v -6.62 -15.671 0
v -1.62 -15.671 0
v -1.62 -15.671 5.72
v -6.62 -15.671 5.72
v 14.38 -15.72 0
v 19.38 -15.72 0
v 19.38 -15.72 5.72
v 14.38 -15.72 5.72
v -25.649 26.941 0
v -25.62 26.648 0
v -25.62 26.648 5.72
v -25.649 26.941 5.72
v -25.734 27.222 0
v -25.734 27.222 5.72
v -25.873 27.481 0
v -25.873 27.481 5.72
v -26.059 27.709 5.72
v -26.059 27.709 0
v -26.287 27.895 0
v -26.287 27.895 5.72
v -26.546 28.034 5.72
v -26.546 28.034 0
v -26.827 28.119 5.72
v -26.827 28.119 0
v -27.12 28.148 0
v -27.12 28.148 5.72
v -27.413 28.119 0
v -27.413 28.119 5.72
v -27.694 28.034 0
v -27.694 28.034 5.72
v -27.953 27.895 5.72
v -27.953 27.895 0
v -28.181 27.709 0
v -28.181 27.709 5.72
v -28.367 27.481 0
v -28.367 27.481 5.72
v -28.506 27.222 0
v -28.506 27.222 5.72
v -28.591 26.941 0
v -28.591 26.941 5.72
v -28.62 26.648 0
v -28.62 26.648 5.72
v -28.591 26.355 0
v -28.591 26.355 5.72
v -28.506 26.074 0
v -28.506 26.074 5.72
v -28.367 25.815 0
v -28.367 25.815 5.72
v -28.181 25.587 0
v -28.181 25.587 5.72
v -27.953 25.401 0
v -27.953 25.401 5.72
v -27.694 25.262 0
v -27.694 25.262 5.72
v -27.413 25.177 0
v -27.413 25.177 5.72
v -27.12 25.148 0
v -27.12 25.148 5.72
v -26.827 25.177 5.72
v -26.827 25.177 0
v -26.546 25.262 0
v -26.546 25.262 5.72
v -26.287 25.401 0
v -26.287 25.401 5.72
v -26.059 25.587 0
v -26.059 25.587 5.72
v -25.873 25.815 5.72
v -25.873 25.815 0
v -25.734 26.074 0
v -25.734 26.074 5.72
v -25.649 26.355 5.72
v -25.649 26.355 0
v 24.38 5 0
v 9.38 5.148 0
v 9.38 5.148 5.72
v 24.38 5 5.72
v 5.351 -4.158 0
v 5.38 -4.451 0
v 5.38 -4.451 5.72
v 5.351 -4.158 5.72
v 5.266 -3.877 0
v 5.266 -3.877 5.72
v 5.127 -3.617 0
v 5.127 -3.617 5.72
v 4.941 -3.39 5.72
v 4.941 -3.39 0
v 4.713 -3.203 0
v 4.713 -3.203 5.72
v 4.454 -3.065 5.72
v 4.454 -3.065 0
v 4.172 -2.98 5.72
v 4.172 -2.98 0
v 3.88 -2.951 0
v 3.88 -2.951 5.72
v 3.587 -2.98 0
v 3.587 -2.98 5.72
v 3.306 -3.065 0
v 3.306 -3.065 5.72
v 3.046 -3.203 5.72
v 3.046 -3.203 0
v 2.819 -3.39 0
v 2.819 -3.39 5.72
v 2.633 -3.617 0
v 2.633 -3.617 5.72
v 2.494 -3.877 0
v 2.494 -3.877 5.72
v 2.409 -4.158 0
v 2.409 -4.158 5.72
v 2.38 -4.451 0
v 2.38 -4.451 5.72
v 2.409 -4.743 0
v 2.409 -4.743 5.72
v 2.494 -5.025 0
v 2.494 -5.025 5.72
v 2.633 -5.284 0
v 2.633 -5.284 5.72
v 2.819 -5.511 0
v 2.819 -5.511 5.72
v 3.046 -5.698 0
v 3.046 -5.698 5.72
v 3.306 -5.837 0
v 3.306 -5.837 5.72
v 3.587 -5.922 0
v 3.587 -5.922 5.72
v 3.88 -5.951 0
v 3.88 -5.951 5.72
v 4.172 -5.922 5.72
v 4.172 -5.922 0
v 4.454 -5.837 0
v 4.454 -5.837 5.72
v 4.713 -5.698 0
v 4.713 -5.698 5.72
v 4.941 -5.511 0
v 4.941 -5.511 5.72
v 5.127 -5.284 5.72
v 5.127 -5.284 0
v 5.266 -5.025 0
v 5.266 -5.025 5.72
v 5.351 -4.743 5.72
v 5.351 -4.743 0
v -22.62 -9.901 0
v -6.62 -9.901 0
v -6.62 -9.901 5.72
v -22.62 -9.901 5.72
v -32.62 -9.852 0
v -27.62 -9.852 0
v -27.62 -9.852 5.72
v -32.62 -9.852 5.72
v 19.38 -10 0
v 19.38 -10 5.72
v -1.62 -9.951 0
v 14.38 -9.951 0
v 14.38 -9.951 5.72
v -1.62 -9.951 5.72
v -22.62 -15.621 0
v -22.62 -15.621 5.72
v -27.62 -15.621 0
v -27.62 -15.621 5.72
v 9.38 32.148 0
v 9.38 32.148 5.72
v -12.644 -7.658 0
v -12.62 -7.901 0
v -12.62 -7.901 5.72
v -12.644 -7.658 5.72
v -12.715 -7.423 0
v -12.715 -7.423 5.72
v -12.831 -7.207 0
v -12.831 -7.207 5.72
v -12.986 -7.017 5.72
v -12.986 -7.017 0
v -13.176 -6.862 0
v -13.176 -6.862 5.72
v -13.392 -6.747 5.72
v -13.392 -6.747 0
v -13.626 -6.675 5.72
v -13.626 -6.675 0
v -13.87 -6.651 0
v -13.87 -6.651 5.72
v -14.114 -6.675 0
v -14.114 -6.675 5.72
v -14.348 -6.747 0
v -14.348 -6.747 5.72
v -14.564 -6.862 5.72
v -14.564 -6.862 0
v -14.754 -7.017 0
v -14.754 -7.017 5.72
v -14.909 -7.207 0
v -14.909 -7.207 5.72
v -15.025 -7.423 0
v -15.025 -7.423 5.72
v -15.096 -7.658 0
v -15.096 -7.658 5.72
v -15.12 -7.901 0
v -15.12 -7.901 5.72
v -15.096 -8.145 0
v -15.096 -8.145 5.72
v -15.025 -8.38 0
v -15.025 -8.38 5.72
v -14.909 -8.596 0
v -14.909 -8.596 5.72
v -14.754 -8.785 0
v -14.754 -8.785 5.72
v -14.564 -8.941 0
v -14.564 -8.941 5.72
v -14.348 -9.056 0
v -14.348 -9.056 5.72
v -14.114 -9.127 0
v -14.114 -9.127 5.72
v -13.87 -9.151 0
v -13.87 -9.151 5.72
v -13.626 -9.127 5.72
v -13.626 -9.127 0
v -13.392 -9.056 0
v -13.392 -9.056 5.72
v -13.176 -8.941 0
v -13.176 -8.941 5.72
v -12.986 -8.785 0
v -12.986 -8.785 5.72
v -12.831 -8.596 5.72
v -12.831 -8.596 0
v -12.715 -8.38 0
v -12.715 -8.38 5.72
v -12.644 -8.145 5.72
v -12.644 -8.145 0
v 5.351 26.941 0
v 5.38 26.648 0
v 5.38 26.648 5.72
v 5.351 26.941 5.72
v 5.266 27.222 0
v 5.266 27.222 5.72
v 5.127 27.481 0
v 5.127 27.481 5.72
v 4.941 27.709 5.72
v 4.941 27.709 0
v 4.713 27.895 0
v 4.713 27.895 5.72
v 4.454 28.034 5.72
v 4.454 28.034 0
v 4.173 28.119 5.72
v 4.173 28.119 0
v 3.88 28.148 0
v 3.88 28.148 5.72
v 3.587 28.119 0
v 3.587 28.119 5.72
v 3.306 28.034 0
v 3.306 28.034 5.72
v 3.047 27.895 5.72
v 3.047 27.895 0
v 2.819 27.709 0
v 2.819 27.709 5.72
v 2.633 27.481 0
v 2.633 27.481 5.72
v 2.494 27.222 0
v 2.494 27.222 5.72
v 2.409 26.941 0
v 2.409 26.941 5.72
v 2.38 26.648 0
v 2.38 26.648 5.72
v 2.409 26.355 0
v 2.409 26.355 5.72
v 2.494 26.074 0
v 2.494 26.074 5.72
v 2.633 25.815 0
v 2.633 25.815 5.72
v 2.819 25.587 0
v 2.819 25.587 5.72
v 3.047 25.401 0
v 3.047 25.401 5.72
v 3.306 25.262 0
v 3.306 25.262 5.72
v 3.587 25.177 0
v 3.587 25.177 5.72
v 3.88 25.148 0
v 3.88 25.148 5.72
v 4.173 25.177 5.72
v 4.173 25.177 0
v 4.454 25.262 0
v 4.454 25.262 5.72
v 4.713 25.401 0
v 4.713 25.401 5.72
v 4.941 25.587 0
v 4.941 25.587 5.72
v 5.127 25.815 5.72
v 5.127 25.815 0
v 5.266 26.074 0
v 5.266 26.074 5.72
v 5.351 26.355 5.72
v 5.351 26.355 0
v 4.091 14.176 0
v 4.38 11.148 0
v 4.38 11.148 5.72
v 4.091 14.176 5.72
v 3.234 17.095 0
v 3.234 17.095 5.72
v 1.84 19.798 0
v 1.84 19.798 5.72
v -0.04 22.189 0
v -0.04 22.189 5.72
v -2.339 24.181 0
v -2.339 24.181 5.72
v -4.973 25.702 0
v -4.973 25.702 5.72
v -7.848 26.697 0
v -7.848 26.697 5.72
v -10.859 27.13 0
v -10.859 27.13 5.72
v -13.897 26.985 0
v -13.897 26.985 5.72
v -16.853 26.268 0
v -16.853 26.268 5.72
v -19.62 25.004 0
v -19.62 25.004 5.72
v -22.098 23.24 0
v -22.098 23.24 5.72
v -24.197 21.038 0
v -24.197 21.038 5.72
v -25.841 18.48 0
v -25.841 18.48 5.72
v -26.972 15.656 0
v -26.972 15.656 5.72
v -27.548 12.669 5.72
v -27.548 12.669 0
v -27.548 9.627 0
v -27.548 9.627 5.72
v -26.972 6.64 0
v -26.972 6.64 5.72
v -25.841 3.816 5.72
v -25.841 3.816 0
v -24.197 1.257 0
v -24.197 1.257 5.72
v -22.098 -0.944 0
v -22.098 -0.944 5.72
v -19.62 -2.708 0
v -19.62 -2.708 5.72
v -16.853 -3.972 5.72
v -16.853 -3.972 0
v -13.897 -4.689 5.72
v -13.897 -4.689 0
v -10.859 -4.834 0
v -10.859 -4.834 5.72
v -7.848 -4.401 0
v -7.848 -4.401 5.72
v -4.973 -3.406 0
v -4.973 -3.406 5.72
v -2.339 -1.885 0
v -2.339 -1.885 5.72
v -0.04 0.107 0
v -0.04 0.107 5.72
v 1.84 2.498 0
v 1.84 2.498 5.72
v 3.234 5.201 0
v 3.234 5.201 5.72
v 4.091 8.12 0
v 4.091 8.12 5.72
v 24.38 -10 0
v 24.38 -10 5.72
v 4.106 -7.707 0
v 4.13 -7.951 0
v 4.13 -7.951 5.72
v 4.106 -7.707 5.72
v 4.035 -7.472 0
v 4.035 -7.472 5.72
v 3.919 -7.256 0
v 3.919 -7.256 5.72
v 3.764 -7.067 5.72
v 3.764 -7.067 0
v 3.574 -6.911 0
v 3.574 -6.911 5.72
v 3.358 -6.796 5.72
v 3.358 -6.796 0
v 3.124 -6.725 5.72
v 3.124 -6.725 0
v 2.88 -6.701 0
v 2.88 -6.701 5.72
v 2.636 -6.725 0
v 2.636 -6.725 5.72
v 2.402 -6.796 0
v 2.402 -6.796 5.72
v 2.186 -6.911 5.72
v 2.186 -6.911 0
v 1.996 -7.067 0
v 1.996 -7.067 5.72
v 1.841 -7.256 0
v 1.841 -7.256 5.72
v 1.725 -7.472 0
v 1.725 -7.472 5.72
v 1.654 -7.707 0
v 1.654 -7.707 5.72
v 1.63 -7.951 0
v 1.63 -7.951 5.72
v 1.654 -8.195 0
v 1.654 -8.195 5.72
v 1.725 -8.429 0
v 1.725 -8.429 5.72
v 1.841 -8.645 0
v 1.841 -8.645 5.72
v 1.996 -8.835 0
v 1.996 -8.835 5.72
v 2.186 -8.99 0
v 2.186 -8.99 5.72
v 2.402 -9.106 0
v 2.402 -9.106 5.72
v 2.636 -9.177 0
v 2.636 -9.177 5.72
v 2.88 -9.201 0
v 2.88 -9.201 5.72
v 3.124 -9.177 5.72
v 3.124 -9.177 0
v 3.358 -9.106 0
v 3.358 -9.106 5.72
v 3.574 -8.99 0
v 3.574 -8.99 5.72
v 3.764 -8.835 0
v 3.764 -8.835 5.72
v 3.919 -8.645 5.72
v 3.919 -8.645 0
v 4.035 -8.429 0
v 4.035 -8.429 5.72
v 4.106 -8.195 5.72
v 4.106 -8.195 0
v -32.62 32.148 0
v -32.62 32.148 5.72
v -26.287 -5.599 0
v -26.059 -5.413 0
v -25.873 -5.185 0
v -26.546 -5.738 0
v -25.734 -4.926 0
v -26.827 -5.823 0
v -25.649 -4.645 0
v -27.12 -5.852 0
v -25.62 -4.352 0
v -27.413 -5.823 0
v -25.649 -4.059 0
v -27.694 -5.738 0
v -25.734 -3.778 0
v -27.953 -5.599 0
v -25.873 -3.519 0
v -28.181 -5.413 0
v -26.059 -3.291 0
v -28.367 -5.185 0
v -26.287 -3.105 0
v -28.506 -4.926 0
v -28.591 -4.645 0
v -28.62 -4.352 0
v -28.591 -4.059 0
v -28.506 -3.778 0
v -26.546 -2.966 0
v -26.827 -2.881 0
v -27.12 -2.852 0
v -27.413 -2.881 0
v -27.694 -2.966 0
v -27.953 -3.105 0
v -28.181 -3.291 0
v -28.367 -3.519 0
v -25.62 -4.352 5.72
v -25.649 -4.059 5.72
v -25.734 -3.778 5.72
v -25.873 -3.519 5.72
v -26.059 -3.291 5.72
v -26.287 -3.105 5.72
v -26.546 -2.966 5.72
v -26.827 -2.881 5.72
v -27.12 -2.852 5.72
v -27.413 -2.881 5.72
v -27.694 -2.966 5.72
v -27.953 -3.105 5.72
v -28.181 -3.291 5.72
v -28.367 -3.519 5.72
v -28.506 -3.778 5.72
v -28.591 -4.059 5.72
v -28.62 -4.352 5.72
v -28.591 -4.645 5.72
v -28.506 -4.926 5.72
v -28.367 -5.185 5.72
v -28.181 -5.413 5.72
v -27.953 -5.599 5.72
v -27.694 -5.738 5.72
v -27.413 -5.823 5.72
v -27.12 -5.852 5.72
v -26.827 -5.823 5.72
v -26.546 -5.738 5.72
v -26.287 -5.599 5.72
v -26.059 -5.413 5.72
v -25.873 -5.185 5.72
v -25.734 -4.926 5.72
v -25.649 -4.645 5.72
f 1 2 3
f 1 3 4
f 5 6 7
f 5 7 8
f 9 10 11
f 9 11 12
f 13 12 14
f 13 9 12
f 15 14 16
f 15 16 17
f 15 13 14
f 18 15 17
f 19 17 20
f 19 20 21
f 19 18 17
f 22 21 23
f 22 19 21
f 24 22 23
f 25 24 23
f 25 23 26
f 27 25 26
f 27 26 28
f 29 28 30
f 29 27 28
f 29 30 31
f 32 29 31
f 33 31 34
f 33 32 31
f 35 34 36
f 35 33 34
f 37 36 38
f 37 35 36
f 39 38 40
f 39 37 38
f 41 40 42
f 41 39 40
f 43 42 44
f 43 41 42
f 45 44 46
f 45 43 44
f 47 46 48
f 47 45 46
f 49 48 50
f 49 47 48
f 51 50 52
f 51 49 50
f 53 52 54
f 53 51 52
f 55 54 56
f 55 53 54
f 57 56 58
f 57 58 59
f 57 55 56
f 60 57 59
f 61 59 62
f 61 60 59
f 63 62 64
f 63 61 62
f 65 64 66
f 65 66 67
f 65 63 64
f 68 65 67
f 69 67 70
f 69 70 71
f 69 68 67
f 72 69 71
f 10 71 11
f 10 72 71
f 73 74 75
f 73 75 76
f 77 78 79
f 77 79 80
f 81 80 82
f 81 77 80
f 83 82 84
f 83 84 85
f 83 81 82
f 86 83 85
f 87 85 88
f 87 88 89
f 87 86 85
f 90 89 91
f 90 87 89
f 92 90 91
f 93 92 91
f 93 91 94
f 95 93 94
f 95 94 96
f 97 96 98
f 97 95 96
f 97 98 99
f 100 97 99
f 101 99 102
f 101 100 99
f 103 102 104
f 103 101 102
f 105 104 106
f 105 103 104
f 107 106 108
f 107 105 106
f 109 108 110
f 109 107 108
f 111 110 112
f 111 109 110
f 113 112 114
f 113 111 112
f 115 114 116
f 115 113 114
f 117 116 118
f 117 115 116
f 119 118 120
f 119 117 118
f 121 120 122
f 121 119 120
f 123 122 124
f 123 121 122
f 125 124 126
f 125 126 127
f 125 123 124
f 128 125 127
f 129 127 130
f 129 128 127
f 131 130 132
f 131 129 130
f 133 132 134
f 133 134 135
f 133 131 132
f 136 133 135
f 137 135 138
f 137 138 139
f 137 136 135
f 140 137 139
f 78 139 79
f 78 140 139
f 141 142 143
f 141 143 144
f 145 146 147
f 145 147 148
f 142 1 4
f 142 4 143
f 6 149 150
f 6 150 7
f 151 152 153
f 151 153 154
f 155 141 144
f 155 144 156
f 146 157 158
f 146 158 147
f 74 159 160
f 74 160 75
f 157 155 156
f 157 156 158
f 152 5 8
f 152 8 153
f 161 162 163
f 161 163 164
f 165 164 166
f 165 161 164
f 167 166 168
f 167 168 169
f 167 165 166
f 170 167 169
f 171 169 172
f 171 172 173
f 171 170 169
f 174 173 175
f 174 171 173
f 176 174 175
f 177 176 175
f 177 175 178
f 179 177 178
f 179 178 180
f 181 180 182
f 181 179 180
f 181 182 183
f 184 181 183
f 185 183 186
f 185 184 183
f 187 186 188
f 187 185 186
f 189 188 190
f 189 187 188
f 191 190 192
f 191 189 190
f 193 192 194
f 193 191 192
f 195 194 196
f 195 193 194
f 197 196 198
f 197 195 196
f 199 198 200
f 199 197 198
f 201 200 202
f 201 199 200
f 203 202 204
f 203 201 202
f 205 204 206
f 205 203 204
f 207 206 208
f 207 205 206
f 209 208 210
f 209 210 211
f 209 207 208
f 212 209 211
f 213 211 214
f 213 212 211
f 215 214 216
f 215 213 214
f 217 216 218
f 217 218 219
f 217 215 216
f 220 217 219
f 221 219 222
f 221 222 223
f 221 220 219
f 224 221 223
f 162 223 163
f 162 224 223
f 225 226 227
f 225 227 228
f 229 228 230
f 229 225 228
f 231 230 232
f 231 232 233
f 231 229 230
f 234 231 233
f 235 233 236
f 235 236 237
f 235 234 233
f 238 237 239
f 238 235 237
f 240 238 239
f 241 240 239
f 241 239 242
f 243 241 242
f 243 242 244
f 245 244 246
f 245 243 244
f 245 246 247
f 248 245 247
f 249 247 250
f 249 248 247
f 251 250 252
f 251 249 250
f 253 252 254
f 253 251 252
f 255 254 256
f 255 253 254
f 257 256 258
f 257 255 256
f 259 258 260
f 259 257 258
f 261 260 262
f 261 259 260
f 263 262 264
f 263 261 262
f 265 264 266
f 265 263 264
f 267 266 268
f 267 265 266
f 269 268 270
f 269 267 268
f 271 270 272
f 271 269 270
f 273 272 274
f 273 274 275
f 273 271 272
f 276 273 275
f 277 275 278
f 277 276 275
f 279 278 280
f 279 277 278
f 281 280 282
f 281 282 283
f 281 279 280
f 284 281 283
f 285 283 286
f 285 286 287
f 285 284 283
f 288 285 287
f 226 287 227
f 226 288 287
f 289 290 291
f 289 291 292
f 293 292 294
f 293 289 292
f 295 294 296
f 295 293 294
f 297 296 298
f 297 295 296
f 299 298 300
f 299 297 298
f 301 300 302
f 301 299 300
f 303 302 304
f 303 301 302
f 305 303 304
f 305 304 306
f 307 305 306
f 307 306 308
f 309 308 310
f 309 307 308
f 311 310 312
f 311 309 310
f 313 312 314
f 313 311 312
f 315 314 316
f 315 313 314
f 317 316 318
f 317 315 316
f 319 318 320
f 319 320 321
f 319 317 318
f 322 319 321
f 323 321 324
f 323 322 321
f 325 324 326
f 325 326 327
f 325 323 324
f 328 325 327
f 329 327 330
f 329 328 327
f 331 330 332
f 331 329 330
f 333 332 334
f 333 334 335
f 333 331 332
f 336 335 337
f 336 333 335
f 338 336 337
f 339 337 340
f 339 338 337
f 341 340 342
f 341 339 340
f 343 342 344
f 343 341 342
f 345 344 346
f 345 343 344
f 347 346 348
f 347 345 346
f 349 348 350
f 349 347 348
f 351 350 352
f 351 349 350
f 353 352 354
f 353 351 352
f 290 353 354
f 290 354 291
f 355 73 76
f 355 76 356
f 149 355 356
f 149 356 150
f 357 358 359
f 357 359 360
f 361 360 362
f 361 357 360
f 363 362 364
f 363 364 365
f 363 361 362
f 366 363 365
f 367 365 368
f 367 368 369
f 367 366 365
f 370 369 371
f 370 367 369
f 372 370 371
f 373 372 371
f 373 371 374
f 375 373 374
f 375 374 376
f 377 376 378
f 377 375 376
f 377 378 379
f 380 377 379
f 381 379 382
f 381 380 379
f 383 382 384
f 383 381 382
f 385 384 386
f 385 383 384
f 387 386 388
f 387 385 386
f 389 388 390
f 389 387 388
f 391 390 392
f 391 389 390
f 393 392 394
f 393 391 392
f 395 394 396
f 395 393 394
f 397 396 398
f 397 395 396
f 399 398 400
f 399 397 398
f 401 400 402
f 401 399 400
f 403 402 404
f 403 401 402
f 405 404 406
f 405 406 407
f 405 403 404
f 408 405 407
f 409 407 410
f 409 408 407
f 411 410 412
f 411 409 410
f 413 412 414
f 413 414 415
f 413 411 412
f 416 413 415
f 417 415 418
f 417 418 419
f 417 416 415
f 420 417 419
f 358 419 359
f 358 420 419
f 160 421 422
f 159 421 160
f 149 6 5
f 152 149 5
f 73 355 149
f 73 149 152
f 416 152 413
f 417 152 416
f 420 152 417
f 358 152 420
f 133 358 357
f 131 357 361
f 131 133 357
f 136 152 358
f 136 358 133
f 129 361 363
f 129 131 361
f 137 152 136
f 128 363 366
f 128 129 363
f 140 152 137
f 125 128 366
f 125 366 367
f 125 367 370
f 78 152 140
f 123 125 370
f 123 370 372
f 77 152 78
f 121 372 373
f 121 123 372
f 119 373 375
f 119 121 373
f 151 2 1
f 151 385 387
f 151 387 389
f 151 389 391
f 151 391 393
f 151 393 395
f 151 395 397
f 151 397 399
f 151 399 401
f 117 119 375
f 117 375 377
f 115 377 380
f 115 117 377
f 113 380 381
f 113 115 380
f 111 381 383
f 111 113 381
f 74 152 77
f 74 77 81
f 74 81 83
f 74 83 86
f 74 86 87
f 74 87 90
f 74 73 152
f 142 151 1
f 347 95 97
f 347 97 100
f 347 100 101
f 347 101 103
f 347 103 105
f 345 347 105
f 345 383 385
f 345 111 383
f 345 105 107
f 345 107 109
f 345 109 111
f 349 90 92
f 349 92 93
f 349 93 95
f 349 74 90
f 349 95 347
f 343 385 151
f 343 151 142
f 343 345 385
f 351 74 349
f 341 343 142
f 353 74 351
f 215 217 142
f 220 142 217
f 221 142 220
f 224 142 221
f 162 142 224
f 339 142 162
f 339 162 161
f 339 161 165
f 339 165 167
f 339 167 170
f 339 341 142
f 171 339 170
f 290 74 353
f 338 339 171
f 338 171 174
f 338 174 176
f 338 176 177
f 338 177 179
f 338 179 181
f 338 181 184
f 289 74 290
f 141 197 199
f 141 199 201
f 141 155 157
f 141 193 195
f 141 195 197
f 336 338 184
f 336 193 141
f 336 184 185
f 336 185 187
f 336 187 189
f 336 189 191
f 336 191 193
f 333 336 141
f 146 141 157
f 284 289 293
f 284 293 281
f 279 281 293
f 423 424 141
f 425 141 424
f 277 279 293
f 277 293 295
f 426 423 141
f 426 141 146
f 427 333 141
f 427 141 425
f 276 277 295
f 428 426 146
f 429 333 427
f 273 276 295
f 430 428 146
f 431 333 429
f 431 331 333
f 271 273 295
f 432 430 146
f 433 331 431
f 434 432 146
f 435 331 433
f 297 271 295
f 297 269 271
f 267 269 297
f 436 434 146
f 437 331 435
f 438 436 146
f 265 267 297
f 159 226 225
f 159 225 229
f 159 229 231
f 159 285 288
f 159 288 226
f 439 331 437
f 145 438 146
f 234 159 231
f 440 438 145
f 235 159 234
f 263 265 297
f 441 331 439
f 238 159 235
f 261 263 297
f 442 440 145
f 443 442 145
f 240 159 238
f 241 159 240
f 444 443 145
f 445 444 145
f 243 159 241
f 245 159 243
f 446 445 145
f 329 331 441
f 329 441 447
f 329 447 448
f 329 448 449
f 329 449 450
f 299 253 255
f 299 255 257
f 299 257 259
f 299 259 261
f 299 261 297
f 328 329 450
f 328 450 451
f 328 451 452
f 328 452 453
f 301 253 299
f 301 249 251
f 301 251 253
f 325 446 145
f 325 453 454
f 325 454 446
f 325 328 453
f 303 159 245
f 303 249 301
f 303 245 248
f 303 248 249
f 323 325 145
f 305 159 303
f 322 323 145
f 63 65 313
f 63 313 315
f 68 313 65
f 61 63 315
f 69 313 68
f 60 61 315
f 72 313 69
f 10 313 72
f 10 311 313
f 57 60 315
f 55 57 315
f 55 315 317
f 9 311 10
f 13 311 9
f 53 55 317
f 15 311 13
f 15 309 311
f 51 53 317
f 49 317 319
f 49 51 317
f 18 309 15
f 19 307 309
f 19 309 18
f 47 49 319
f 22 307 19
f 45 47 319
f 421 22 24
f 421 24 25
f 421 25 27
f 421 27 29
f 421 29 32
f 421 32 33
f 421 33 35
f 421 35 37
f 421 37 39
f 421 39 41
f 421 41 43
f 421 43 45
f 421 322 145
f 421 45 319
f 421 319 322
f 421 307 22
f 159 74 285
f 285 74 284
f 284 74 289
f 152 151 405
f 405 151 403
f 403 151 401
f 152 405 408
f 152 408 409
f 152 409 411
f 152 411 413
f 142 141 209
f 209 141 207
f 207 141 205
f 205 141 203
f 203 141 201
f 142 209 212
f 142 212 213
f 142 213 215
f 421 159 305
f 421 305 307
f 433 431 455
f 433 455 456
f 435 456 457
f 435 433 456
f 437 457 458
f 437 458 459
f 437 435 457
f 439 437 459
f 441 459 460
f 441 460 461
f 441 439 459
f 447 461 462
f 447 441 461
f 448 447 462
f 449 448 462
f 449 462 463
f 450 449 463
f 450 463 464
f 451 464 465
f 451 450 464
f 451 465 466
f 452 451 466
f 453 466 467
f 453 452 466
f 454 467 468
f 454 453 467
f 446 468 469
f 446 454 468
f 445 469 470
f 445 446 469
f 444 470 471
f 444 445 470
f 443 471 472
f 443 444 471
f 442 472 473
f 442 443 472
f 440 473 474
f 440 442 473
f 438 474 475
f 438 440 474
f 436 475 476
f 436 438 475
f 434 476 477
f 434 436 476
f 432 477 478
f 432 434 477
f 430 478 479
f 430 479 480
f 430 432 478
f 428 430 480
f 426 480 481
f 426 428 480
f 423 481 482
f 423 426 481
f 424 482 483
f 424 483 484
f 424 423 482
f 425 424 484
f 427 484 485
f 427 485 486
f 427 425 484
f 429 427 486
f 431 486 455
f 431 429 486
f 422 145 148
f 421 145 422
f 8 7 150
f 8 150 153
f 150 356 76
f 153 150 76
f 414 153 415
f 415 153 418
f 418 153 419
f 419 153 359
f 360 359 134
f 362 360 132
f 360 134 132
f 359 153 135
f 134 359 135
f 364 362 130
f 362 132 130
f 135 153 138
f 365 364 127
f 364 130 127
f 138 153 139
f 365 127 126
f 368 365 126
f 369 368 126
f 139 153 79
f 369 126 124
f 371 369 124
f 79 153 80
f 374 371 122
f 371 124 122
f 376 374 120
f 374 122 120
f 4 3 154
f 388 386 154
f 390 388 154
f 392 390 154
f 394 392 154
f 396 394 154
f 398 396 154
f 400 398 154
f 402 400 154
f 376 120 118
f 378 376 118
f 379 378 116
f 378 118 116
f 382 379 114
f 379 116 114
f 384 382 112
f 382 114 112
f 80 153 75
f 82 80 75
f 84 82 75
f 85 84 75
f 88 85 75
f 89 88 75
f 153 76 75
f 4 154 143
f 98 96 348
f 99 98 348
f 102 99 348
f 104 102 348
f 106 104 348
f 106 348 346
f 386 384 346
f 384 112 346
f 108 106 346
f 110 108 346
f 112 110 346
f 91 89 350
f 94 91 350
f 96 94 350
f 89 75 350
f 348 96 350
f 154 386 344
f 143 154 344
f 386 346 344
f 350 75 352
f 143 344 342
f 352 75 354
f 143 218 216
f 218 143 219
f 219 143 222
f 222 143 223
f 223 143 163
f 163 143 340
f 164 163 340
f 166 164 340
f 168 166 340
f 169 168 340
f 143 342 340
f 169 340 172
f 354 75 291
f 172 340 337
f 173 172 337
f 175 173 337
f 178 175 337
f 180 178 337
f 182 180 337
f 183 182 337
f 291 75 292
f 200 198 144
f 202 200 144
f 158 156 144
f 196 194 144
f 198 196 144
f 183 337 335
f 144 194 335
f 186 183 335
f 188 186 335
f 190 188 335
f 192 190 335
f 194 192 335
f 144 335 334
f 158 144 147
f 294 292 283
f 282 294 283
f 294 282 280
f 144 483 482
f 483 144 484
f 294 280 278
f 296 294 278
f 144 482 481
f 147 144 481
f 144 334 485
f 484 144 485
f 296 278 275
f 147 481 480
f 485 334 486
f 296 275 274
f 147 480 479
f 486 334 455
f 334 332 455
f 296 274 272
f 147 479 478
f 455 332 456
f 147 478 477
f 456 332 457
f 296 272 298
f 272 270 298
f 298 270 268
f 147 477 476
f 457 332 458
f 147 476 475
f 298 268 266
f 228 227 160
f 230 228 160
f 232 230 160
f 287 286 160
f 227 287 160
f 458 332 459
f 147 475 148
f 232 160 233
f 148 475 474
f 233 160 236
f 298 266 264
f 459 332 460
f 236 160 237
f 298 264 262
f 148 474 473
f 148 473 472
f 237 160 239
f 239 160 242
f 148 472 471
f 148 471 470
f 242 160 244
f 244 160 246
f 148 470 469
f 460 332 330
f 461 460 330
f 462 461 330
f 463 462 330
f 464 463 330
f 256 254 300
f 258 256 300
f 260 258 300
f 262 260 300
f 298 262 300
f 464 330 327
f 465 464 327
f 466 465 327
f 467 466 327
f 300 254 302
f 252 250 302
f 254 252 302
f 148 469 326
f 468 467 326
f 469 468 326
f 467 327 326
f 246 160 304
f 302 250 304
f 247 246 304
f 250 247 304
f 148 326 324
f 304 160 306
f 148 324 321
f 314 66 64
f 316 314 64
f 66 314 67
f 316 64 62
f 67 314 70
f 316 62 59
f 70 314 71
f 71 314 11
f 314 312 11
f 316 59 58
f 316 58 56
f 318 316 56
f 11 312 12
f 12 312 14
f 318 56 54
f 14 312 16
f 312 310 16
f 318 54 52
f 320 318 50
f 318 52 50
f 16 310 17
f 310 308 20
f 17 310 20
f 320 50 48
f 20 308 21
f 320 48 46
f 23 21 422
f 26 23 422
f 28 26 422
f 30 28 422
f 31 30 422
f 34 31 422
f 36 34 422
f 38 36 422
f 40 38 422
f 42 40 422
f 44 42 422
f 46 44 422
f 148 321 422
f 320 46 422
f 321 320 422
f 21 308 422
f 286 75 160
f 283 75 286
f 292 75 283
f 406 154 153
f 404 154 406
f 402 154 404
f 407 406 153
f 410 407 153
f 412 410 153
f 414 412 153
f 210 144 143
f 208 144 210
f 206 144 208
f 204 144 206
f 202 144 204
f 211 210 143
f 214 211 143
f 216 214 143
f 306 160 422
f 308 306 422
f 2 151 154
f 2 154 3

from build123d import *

# Parameters (mm, degrees)
SKETCH1_R           = 16
SKETCH1_R_2         = 1.25
SKETCH1_R_3         = 1.5
BOSS_EXTRUDE1_DEPTH = 5.72


with BuildPart() as part:
    # Sketch1 → Boss-Extrude1 (new body)
    with BuildSketch(Plane.XY):
        Polygon((9.38, 32.147938931), (9.38, 5.147938931), (24.38, 5), (24.38, -10), (19.38, -10), (19.38, -15.72), (14.38, -15.72), (14.38, -9.950687023), (-1.62, -9.950687023), (-1.62, -15.670687023), (-6.62, -15.670687023), (-6.62, -9.901374046), (-22.62, -9.901374046), (-22.62, -15.621374046), (-27.62, -15.621374046), (-27.62, -9.852061069), (-32.62, -9.852061069), (-32.62, 32.147938931), align=None)
        with Locations((-11.62, 11.147938931)):
            Circle(SKETCH1_R, mode=Mode.SUBTRACT)
        with Locations((2.88, -7.950687023)):
            Circle(SKETCH1_R_2, mode=Mode.SUBTRACT)
        with Locations((-13.87, -7.901374046)):
            Circle(SKETCH1_R_2, mode=Mode.SUBTRACT)
        with Locations((3.879843111, -4.450687023)):
            Circle(SKETCH1_R_3, mode=Mode.SUBTRACT)
        with Locations((-27.12, -4.352061069)):
            Circle(SKETCH1_R_3, mode=Mode.SUBTRACT)
        with Locations((-27.12, 26.647938931)):
            Circle(SKETCH1_R_3, mode=Mode.SUBTRACT)
        with Locations((3.88, 26.647938931)):
            Circle(SKETCH1_R_3, mode=Mode.SUBTRACT)
    extrude(amount=BOSS_EXTRUDE1_DEPTH)


solid = part.part
